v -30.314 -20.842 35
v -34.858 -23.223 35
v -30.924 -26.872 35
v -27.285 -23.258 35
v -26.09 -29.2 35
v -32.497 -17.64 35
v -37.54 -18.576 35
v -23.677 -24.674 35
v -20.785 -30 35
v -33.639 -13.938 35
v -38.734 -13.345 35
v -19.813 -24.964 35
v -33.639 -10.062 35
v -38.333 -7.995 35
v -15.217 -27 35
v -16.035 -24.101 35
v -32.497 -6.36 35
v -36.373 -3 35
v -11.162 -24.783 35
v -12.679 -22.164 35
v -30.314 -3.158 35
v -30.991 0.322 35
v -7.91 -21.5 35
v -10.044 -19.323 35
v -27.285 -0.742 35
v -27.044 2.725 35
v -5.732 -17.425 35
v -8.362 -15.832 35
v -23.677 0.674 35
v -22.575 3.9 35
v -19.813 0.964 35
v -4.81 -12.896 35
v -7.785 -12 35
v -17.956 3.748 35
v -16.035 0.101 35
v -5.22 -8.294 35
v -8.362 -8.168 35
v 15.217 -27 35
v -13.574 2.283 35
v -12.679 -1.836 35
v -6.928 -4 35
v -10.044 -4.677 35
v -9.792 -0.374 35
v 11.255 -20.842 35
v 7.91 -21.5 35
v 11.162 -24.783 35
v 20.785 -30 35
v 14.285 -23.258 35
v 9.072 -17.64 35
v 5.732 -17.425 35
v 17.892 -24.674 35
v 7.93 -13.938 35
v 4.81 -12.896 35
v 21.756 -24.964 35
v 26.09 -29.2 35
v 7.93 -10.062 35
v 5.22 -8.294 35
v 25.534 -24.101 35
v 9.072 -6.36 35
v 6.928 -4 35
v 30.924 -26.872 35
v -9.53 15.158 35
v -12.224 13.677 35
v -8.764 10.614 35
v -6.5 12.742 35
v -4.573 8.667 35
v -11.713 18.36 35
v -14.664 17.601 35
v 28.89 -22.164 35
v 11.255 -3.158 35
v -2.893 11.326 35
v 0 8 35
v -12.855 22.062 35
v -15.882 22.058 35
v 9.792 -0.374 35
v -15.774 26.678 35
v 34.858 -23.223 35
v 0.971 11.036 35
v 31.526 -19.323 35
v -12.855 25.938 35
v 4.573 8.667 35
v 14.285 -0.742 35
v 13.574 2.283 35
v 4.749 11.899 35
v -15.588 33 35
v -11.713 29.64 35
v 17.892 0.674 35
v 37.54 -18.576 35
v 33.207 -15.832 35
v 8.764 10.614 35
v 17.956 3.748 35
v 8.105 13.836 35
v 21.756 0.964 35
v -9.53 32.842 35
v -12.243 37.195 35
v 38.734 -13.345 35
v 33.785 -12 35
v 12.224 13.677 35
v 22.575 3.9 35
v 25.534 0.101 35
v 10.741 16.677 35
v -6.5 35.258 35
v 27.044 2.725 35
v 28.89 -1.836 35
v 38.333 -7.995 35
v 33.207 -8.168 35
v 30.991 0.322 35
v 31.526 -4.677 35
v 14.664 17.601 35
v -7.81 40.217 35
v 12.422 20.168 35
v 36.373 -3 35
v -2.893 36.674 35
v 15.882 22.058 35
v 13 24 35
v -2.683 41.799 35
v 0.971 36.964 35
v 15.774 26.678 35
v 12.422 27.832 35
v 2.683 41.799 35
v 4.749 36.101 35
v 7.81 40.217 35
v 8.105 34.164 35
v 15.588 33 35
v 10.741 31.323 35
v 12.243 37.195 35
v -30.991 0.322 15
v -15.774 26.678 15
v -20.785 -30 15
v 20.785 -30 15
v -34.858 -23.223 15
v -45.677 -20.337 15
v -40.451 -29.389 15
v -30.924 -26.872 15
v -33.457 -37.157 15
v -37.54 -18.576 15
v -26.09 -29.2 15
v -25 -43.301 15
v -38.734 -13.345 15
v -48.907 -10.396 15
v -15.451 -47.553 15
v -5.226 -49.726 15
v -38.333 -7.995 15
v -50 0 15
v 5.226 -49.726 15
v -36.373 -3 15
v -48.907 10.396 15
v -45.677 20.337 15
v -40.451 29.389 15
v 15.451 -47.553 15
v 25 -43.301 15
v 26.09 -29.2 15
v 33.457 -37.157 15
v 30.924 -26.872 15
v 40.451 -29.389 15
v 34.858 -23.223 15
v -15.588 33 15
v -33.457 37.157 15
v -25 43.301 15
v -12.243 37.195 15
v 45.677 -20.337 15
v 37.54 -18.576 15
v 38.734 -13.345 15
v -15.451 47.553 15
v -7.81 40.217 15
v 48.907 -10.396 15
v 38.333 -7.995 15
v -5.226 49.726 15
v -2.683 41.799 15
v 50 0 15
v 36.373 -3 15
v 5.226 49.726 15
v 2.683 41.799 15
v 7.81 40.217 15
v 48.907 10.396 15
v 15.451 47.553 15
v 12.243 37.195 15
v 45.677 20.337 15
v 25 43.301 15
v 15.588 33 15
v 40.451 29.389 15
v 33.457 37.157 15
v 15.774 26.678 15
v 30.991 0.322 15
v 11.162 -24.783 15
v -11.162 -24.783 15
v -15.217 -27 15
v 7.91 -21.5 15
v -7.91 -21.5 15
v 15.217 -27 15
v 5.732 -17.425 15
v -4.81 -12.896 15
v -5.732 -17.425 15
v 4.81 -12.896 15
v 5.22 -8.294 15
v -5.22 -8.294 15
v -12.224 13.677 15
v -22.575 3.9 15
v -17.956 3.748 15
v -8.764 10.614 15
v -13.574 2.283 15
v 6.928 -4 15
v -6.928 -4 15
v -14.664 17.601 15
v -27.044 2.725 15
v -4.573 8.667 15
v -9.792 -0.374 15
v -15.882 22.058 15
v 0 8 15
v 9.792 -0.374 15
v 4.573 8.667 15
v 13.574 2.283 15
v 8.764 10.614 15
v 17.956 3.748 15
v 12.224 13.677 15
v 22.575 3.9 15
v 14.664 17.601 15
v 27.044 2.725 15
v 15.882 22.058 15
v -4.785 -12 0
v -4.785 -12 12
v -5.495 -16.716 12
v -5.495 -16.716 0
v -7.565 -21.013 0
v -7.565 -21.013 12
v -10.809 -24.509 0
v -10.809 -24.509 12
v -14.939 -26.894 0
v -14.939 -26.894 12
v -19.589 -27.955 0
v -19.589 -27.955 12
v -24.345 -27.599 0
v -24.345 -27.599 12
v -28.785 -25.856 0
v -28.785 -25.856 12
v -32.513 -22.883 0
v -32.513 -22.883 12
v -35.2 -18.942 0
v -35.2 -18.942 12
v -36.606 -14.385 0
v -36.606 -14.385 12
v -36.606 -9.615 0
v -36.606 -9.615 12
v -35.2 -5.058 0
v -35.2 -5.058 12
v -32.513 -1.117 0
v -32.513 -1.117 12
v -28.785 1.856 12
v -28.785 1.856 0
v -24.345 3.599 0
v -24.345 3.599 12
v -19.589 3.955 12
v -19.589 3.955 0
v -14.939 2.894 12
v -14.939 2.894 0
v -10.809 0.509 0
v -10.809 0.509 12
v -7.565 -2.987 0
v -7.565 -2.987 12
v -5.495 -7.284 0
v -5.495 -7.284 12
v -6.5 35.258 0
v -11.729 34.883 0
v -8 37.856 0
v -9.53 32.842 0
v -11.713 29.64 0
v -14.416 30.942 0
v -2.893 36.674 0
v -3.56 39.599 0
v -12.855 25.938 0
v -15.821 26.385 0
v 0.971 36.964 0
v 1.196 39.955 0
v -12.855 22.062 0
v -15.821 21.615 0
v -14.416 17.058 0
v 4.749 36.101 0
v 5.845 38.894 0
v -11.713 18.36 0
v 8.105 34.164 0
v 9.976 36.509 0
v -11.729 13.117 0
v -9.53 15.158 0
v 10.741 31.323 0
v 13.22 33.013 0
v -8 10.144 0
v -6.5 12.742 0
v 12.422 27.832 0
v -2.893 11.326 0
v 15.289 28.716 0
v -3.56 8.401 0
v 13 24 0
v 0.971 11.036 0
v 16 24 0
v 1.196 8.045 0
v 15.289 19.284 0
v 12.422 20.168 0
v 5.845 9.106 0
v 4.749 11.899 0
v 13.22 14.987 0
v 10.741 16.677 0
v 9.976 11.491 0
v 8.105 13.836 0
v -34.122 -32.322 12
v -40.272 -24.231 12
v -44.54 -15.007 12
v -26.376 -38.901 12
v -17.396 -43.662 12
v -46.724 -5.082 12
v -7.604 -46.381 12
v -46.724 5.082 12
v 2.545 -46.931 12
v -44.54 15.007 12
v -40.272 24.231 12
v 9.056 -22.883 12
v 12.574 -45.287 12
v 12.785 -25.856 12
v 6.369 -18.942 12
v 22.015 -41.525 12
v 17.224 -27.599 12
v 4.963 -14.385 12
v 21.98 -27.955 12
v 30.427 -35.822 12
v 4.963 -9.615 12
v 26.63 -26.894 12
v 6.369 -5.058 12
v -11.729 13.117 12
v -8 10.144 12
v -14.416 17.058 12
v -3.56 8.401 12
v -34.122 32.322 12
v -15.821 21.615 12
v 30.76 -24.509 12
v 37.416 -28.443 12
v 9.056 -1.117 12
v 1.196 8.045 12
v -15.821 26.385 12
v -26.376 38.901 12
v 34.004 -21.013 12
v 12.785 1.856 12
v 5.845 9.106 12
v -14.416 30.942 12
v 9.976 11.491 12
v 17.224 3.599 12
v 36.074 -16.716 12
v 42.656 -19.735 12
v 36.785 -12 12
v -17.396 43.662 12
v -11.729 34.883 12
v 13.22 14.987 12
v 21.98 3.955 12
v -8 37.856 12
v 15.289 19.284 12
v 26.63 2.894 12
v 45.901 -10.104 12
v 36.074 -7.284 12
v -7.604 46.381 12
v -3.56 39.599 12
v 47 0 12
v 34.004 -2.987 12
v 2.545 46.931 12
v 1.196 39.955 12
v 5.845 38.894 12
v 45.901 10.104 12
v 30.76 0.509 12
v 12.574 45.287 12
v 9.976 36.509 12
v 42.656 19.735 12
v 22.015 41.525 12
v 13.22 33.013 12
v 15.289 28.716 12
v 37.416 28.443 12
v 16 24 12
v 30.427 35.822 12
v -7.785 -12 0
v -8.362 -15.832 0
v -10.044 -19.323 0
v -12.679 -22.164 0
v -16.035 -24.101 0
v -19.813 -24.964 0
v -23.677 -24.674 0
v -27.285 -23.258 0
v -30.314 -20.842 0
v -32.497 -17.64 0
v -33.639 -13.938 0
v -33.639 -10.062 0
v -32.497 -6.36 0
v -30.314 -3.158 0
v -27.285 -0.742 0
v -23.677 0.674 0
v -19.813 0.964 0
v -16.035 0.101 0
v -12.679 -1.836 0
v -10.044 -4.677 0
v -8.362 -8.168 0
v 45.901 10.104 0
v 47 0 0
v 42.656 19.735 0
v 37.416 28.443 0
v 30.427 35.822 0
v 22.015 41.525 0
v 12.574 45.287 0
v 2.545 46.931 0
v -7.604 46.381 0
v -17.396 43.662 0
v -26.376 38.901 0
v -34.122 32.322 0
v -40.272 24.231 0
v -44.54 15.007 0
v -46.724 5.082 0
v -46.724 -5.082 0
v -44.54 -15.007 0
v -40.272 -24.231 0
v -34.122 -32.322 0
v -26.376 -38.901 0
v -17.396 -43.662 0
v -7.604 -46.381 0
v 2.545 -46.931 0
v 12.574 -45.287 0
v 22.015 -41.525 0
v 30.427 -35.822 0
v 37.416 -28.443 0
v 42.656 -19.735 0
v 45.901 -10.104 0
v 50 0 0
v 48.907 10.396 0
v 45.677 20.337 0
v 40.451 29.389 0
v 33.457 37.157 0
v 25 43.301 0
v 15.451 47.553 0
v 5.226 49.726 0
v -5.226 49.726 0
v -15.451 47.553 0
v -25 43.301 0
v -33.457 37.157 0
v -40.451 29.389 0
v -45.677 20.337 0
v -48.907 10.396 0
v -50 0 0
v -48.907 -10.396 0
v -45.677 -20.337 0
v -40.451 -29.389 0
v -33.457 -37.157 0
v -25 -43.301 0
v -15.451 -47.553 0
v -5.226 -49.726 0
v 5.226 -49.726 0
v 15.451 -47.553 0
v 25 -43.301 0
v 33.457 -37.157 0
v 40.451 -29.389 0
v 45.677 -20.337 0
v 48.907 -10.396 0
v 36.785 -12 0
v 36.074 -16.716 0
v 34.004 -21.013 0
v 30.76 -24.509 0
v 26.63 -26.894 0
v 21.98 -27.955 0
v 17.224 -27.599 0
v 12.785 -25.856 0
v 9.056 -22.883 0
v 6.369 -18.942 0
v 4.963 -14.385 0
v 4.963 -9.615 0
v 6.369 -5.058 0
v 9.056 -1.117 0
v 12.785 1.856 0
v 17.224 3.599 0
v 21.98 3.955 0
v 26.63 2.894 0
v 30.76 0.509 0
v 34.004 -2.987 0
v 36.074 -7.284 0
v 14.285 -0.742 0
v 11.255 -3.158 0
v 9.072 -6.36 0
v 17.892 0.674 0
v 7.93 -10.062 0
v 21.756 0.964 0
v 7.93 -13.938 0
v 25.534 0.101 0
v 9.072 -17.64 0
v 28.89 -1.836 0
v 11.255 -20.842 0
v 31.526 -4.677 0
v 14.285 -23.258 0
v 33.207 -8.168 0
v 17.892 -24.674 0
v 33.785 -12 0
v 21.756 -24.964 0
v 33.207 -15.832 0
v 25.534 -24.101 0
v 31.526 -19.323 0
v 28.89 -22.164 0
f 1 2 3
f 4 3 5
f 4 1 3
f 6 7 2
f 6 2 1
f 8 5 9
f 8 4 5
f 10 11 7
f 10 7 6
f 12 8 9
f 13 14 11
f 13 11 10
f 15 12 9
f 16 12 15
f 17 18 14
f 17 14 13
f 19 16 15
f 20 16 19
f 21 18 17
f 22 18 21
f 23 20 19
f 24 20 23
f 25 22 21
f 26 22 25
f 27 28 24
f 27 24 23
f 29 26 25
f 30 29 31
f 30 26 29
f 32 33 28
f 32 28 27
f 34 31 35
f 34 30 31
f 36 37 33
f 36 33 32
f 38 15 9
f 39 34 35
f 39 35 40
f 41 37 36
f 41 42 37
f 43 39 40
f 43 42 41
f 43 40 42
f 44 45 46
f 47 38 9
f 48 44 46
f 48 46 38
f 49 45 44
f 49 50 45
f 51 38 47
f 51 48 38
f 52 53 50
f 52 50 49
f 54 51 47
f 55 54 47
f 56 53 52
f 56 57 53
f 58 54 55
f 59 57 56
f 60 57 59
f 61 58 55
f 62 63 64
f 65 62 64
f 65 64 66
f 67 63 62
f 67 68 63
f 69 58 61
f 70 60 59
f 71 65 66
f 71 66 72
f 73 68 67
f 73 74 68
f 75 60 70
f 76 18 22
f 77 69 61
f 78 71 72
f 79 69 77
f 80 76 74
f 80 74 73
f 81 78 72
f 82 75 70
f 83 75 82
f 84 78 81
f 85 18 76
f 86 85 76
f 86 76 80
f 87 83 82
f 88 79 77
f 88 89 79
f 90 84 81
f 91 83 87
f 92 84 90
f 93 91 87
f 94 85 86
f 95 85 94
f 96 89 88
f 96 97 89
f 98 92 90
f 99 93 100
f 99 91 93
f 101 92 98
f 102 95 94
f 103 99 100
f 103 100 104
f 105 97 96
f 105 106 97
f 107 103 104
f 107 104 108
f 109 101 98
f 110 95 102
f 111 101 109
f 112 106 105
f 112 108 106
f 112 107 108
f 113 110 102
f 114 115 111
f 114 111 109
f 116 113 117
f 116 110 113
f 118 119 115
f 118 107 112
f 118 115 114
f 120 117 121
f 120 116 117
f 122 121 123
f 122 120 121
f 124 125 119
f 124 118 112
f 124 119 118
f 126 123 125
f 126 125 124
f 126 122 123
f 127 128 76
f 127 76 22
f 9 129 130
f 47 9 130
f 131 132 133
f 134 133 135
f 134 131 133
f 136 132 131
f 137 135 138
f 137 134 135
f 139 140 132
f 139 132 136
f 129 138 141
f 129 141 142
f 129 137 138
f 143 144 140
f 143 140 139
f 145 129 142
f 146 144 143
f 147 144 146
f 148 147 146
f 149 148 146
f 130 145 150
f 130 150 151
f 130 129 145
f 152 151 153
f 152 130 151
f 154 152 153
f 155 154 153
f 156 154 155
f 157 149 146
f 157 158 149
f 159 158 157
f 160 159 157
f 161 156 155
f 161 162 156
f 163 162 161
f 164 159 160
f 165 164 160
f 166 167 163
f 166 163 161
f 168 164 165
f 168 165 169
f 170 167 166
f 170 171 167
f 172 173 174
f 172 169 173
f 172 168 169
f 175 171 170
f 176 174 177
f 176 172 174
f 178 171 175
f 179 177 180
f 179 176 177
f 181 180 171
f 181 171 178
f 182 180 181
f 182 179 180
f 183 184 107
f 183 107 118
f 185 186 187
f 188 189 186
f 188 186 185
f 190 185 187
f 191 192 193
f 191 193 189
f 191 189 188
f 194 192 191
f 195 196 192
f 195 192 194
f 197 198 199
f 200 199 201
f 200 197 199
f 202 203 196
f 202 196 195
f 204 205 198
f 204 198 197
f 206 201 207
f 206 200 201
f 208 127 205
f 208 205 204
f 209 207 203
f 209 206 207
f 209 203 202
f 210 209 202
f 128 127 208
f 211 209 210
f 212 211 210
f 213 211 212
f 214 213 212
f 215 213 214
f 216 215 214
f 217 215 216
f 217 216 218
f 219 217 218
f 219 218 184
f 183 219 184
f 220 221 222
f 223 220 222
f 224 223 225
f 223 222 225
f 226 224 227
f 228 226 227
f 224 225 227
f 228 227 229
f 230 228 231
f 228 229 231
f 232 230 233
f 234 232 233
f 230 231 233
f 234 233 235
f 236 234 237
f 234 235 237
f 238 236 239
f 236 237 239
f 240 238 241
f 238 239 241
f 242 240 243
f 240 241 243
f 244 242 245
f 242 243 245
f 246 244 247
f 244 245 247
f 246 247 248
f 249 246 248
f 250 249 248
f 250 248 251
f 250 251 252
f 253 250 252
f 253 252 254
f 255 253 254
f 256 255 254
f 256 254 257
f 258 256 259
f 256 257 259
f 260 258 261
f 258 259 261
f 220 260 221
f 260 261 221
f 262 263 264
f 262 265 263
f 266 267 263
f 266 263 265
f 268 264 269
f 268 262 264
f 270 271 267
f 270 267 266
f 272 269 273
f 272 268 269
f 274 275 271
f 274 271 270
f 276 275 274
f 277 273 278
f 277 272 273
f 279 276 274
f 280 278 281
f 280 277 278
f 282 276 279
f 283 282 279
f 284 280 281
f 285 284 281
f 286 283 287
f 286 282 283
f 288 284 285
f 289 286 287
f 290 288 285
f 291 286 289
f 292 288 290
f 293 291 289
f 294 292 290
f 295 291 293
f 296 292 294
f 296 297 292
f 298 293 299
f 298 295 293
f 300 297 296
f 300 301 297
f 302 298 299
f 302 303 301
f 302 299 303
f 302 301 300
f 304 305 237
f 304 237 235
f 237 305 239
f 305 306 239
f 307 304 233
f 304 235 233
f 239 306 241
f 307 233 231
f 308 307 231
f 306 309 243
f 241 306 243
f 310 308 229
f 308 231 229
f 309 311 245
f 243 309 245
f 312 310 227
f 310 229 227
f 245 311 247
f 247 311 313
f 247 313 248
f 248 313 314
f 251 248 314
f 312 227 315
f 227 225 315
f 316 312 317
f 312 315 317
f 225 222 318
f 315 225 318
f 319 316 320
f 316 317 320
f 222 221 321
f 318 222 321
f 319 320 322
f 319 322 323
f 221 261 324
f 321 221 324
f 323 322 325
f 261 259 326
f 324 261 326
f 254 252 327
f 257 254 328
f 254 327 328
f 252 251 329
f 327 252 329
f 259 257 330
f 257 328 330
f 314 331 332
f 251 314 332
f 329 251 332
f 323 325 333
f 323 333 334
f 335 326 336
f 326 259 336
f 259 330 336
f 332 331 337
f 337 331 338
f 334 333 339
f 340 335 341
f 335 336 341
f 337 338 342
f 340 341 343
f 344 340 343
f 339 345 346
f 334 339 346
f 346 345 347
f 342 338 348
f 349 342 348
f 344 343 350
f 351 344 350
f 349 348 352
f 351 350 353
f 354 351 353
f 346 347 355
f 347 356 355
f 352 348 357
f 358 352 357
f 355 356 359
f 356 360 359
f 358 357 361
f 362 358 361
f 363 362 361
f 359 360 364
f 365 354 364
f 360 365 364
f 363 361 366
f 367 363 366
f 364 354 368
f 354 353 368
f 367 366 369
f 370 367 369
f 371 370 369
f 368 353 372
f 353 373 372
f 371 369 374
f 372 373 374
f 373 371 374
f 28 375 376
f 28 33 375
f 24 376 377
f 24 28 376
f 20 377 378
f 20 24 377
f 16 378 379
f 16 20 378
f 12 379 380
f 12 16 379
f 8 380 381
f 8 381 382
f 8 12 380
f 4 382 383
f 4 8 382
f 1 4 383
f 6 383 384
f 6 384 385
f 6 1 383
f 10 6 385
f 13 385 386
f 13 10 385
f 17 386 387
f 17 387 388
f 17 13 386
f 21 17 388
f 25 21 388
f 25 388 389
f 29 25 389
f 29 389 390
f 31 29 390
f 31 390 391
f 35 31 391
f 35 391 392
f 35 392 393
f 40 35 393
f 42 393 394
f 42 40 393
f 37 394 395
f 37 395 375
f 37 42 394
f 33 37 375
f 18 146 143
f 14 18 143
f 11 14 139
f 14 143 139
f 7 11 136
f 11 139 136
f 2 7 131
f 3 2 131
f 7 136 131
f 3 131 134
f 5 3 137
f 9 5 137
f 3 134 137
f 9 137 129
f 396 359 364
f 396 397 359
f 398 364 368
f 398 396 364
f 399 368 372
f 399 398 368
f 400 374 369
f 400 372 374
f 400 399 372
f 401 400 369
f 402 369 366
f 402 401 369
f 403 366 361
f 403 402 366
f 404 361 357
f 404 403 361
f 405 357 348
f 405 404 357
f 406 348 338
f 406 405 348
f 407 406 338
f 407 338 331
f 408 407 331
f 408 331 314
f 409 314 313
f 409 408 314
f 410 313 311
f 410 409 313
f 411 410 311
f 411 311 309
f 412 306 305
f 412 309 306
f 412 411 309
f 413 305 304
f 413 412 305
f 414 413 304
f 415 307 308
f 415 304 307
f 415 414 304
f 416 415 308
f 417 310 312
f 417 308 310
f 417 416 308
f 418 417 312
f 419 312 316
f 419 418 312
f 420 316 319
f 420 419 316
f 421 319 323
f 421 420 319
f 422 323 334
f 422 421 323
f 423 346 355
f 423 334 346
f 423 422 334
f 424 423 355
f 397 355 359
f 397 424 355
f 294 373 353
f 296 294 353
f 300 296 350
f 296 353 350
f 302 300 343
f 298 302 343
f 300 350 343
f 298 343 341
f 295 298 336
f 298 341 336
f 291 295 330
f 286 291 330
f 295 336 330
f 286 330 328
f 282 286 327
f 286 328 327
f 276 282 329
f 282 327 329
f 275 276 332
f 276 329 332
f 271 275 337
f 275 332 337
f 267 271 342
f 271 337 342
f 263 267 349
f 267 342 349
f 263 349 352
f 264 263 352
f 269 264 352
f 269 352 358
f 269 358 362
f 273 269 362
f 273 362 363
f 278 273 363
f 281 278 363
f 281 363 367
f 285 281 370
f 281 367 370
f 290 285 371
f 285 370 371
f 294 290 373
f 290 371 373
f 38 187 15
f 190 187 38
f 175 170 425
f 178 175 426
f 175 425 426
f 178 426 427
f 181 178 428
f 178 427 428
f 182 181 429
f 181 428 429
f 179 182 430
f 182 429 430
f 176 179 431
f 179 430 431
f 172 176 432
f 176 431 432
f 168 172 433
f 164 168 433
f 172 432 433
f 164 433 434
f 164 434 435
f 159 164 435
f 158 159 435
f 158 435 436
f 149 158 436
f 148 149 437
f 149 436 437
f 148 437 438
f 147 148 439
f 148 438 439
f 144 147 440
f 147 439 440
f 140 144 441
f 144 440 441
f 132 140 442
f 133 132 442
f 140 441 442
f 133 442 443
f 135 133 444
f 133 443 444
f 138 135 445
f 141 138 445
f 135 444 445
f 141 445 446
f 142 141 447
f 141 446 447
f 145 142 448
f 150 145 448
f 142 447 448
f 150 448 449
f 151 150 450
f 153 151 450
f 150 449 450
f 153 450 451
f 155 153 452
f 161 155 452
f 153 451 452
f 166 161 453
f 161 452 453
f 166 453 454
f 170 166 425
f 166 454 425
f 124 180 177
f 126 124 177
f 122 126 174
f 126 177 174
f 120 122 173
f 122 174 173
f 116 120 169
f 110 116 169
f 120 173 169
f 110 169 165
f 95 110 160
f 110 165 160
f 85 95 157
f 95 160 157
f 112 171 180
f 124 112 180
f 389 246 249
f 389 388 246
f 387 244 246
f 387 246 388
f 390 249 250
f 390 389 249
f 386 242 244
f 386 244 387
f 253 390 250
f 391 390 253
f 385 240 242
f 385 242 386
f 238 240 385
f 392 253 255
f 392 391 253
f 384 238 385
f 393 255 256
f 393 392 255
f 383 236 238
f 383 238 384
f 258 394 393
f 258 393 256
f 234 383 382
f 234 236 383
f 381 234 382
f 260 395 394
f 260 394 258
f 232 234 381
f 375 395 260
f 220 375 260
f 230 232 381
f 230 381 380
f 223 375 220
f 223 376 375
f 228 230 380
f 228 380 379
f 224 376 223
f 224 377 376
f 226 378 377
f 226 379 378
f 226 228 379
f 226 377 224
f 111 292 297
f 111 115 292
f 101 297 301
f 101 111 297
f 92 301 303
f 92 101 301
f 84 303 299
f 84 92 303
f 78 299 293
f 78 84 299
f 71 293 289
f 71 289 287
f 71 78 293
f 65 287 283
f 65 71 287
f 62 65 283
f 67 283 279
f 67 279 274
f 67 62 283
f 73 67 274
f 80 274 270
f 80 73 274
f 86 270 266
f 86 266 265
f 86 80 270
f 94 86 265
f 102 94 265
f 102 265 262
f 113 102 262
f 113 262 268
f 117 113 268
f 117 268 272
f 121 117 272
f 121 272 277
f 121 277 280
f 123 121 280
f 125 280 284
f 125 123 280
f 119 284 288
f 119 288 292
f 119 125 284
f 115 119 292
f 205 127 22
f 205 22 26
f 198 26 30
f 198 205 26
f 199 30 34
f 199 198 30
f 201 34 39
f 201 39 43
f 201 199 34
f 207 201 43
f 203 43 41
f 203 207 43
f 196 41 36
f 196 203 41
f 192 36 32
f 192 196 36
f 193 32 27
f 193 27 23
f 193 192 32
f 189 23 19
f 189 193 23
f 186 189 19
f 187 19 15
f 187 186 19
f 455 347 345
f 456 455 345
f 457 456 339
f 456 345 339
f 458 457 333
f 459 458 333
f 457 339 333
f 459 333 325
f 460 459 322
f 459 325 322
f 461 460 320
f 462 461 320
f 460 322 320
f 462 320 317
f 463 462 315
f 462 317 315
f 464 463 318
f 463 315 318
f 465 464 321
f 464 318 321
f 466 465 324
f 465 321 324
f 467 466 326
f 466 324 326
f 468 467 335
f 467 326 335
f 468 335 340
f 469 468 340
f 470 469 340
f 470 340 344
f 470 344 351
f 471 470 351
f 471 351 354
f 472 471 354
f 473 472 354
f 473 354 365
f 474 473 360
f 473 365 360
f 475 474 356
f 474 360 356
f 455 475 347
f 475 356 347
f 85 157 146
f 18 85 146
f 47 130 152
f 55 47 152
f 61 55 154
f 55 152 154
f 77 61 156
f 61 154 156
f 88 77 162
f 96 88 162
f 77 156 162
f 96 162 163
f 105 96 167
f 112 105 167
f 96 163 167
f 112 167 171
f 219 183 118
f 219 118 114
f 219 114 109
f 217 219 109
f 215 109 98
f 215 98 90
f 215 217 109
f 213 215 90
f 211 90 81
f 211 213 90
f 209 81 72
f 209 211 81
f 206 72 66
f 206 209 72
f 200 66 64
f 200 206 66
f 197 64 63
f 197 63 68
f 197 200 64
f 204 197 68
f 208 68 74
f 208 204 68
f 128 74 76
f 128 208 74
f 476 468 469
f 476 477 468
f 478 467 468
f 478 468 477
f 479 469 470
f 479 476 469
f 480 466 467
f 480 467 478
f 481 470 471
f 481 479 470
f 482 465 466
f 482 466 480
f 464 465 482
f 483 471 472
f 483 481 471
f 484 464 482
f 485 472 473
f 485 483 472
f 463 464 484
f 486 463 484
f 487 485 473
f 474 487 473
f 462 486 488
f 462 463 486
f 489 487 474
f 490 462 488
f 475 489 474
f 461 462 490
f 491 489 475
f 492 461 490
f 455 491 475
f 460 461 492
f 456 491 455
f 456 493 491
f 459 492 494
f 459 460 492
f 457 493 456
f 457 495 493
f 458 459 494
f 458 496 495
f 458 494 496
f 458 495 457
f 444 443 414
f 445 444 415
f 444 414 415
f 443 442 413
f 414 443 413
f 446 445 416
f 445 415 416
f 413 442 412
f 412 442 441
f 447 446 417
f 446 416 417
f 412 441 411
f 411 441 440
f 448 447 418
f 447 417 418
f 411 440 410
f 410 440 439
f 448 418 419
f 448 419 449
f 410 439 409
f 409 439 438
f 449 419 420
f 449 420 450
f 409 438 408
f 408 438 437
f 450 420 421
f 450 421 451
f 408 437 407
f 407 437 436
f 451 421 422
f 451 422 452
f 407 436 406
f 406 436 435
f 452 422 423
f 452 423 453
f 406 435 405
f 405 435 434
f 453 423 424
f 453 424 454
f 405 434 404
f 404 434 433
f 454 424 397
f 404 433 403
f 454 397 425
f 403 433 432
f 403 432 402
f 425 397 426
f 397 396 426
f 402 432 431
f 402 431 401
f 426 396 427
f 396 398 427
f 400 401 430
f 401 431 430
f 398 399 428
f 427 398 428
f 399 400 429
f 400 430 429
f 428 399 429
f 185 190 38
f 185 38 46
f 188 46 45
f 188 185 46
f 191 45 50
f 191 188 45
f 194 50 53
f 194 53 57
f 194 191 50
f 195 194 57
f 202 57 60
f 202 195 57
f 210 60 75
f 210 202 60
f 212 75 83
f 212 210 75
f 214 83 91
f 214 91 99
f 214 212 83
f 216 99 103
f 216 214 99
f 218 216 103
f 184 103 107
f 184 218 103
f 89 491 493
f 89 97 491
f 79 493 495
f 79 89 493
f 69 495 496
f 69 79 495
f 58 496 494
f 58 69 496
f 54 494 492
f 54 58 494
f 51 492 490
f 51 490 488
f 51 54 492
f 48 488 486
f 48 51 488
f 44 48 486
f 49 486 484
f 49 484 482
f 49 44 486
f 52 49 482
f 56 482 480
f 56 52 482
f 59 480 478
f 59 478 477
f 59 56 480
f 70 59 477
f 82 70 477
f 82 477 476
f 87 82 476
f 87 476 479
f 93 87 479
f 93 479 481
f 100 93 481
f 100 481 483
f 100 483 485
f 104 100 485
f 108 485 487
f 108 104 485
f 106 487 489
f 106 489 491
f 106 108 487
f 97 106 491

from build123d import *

# Parameters (mm, degrees)
SKETCH_1_R          = 50
EXTRUDE_1_DEPTH     = 15
SHELL_1_T           = -3
EXTRUDE_2_DEPTH     = 20
SKETCH_3_R          = 13
CUT_EXTRUDE_1_DEPTH = 79.89866919
SKETCH_4_R          = 16
SKETCH_4_R_2        = 13
EXTRUDE_3_DEPTH     = 12
SHELL_START         = 15
SHELL_5_DEPTH       = 20


# Read off the part's stored shape, not the designer's step: 薄殼5
with BuildPart() as part:
    # 草圖1 → 填料-伸長1 (new body)
    with BuildSketch(Plane.XY):
        Circle(SKETCH_1_R)
    extrude(amount=EXTRUDE_1_DEPTH)

    # 薄殼1
    shell_1_openings = [part.faces().sort_by_distance(p)[0] for p in [
        (0, 0, 0),
    ]]
    offset(amount=SHELL_1_T, openings=shell_1_openings, kind=Kind.INTERSECTION)

    # 草圖2 → 填料-伸長2 (add)
    with BuildSketch(Plane.XY.offset(15)):
        with BuildLine():
            Line((-15.588457268, 33), (-36.373066959, -3))
            ThreePointArc((-36.373066959, -3), (-36.373066959, -21), (-20.784609691, -30))
            Line((-20.784609691, -30), (20.784609691, -30))
            ThreePointArc((20.784609691, -30), (36.373066959, -21), (36.373066959, -3))
            Line((36.373066959, -3), (15.588457268, 33))
            ThreePointArc((15.588457268, 33), (0, 42), (-15.588457268, 33))
        make_face()
    extrude(amount=EXTRUDE_2_DEPTH)

    # 草圖3 → 除料-伸長1 (cut, through all)
    with BuildSketch(Plane.XY.offset(35)):
        with Locations((0, 24)):
            Circle(SKETCH_3_R)
        with Locations((-20.784609691, -12)):
            Circle(SKETCH_3_R)
        with Locations((20.784609691, -12)):
            Circle(SKETCH_3_R)
    extrude(amount=-CUT_EXTRUDE_1_DEPTH, mode=Mode.SUBTRACT)

    # 草圖4 → 填料-伸長3 (add)
    # profile 1 of 3: a face of its own
    with BuildSketch(Plane(origin=(0, 0, 12), x_dir=(-1, 0, 0), z_dir=(0, 0, -1))):
        with Locations(Location((0, 24, 0), (0, 0, 180))):
            Circle(SKETCH_4_R)
        with Locations(Location((0, 24, 0), (0, 0, 180))):
            Circle(SKETCH_4_R_2, mode=Mode.SUBTRACT)
    # profile 2 of 3: a face of its own
    with BuildSketch(Plane(origin=(0, 0, 12), x_dir=(-1, 0, 0), z_dir=(0, 0, -1))):
        with Locations(Location((20.784609691, -12, 0), (0, 0, 180))):
            Circle(SKETCH_4_R)
        with Locations(Location((20.784609691, -12, 0), (0, 0, 180))):
            Circle(SKETCH_4_R_2, mode=Mode.SUBTRACT)
    # profile 3 of 3: a face of its own
    with BuildSketch(Plane(origin=(0, 0, 12), x_dir=(-1, 0, 0), z_dir=(0, 0, -1))):
        with Locations(Location((-20.784609691, -12, 0), (0, 0, 180))):
            Circle(SKETCH_4_R)
        with Locations(Location((-20.784609691, -12, 0), (0, 0, 180))):
            Circle(SKETCH_4_R_2, mode=Mode.SUBTRACT)
    extrude(amount=EXTRUDE_3_DEPTH)

    # 薄殼5 outline → 薄殼5 (cut)
    with BuildSketch(Plane.XY.offset(SHELL_START)):
        with BuildLine():
            ThreePointArc((15.774263238, 26.67817462), (0, 8), (-15.774263238, 26.67817462))
            Line((-15.774263238, 26.67817462), (-30.991108566, 0.32182538))
            ThreePointArc((-30.991108566, 0.32182538), (-6.92820323, -4), (-15.216845328, -27))
            Line((-15.216845328, -27), (15.216845328, -27))
            ThreePointArc((15.216845328, -27), (6.92820323, -4), (30.991108566, 0.32182538))
            Line((30.991108566, 0.32182538), (15.774263238, 26.67817462))
        make_face()
    extrude(amount=SHELL_5_DEPTH, mode=Mode.SUBTRACT)


solid = part.part
